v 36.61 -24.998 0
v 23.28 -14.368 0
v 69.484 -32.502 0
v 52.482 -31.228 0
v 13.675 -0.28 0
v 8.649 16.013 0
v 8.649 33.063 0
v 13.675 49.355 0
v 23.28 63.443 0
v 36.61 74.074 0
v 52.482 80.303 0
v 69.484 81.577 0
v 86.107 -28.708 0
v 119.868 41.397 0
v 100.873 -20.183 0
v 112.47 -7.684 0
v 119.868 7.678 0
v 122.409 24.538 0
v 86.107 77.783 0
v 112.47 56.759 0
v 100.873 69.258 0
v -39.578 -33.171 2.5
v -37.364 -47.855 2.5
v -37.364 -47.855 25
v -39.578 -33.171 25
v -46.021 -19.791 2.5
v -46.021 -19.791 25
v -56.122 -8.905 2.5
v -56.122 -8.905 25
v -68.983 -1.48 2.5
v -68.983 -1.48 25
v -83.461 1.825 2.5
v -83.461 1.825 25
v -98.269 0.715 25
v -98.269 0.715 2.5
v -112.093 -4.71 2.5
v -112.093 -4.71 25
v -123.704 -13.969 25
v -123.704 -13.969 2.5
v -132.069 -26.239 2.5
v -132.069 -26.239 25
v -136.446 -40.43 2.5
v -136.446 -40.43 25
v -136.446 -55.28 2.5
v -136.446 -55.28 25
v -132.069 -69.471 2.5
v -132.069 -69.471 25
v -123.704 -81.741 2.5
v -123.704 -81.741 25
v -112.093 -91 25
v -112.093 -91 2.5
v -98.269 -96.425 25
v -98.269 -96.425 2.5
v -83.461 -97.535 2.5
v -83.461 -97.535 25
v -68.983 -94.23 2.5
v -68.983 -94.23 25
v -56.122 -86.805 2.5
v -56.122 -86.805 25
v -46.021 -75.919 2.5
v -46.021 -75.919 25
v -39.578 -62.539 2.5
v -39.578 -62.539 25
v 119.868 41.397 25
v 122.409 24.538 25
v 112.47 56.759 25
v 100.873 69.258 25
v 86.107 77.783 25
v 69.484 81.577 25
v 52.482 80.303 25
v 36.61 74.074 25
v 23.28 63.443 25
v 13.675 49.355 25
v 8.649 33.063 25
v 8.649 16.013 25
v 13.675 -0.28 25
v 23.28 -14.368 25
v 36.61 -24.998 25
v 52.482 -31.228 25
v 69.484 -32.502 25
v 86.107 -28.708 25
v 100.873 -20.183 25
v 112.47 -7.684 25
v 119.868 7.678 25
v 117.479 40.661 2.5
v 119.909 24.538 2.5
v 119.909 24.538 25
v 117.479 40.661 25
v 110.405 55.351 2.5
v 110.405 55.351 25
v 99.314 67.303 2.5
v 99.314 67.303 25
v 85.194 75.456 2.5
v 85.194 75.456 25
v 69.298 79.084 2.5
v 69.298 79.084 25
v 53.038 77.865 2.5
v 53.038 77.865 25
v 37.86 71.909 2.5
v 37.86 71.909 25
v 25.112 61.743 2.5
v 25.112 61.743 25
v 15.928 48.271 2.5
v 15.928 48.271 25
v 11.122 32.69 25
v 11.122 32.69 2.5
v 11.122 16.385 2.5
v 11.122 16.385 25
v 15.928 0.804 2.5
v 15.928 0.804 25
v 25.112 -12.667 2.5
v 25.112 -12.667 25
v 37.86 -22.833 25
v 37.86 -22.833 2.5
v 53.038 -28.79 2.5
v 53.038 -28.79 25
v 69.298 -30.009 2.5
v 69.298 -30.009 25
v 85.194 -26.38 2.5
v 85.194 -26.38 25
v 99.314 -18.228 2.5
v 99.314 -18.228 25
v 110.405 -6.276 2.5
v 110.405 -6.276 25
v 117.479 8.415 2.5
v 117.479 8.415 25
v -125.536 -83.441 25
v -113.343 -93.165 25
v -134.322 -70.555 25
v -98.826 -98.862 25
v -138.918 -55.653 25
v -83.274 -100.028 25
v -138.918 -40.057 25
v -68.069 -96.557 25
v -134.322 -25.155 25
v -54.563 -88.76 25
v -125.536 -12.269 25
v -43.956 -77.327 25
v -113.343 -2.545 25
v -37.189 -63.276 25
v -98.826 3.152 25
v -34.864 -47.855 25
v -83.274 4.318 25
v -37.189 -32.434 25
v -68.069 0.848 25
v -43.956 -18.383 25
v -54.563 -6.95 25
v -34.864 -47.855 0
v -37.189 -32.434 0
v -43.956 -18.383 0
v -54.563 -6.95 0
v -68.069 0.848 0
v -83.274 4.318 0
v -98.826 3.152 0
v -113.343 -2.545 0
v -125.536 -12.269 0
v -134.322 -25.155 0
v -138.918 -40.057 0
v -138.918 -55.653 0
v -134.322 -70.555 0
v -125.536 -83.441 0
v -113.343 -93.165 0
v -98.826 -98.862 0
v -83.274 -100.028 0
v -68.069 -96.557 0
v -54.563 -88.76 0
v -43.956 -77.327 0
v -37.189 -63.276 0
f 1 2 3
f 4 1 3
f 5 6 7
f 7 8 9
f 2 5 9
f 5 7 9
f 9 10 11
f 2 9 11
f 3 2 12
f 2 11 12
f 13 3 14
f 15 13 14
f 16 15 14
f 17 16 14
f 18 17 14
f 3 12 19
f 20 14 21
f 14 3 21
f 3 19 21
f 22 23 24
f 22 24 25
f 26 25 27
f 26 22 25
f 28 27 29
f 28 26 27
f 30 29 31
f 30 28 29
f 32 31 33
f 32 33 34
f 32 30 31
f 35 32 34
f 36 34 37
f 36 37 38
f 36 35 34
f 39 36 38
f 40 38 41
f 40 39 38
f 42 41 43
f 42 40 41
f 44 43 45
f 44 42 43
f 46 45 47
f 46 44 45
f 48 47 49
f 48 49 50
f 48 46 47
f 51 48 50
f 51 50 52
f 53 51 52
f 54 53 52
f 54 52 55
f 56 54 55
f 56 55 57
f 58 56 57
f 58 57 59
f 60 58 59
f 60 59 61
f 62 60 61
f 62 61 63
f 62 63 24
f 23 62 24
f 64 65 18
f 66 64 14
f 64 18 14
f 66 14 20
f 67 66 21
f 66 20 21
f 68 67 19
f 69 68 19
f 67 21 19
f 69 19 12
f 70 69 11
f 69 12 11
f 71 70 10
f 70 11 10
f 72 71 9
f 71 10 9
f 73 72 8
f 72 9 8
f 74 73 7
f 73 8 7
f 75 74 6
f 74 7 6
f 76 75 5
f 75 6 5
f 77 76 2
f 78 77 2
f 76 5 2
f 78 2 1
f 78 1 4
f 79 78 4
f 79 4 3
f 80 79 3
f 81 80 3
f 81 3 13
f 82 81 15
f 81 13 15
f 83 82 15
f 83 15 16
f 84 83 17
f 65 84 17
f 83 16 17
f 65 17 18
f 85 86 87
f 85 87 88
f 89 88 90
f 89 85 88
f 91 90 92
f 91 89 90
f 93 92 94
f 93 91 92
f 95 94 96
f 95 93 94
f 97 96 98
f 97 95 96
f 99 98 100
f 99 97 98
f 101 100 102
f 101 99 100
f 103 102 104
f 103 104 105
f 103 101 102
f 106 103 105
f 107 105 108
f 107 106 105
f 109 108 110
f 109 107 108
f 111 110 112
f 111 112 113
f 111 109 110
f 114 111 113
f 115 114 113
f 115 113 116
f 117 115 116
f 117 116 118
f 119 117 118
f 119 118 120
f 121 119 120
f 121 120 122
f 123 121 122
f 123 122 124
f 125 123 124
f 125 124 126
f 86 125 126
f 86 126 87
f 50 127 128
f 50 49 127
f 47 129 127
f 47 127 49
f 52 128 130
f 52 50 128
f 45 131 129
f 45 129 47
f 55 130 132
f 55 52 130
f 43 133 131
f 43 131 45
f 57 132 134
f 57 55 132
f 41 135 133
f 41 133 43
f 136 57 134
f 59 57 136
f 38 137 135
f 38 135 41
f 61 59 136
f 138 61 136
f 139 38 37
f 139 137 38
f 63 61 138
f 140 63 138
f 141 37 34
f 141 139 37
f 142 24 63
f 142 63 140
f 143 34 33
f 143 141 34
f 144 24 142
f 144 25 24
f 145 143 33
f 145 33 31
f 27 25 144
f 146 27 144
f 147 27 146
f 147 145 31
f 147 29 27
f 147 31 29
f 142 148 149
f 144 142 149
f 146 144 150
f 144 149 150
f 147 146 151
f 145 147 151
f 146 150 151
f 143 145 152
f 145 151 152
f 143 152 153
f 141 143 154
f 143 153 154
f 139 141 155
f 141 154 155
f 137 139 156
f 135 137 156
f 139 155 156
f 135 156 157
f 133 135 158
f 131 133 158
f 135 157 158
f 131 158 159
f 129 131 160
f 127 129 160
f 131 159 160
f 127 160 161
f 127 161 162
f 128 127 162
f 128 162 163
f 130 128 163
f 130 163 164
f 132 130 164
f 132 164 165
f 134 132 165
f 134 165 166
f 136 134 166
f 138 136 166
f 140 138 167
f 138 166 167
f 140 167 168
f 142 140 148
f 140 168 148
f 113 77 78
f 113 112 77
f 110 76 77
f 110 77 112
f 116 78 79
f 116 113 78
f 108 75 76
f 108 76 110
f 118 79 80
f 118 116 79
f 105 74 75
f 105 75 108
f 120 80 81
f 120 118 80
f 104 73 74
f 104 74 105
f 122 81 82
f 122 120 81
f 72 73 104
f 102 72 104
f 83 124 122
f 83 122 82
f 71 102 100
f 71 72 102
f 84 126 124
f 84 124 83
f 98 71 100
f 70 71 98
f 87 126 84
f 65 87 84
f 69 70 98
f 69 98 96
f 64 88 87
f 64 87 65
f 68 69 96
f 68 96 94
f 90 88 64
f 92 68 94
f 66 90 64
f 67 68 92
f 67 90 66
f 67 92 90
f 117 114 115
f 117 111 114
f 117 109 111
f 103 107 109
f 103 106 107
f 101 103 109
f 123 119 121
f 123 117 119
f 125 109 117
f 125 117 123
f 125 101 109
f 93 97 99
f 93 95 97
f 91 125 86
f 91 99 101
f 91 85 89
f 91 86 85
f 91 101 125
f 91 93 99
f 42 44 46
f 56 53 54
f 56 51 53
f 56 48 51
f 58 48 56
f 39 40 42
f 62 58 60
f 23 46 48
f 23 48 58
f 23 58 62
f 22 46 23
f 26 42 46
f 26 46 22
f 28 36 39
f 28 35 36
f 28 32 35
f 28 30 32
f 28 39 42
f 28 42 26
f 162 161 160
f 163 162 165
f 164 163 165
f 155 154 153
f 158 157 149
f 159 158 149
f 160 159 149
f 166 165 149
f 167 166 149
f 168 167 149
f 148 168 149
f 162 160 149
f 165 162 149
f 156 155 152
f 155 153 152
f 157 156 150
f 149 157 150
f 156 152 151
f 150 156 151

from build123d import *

# Parameters (mm, degrees)
F0_R     = 52.3191449933
F1_DEPTH = 25
F0_R_2   = 57.1992662259
F2_T     = -2.5
F2_2_T   = -2.5


with BuildPart() as f1:
    # F0 (on Top) → F1 (new body)
    with BuildSketch(Plane.XY):
        with Locations((-87.1836170554, -47.8549711406)):
            Circle(F0_R)
    extrude(amount=F1_DEPTH)

    # F2
    f2_openings = [f1.faces().sort_by_distance(p)[0] for p in [
        (-87.183617, -47.854971, 25),
    ]]
    offset(amount=F2_T, openings=f2_openings)


with BuildPart() as f1b:
    # F0 (on Top) → F1, piece 2 (new body)
    with BuildSketch(Plane.XY):
        with Locations((65.2098879218, 24.5376173407)):
            Circle(F0_R_2)
    extrude(amount=F1_DEPTH)

    # F2#2
    f2_2_openings = [f1b.faces().sort_by_distance(p)[0] for p in [
        (65.209888, 24.537617, 25),
    ]]
    offset(amount=F2_2_T, openings=f2_2_openings)


solid = Compound([f1.part, f1b.part])
